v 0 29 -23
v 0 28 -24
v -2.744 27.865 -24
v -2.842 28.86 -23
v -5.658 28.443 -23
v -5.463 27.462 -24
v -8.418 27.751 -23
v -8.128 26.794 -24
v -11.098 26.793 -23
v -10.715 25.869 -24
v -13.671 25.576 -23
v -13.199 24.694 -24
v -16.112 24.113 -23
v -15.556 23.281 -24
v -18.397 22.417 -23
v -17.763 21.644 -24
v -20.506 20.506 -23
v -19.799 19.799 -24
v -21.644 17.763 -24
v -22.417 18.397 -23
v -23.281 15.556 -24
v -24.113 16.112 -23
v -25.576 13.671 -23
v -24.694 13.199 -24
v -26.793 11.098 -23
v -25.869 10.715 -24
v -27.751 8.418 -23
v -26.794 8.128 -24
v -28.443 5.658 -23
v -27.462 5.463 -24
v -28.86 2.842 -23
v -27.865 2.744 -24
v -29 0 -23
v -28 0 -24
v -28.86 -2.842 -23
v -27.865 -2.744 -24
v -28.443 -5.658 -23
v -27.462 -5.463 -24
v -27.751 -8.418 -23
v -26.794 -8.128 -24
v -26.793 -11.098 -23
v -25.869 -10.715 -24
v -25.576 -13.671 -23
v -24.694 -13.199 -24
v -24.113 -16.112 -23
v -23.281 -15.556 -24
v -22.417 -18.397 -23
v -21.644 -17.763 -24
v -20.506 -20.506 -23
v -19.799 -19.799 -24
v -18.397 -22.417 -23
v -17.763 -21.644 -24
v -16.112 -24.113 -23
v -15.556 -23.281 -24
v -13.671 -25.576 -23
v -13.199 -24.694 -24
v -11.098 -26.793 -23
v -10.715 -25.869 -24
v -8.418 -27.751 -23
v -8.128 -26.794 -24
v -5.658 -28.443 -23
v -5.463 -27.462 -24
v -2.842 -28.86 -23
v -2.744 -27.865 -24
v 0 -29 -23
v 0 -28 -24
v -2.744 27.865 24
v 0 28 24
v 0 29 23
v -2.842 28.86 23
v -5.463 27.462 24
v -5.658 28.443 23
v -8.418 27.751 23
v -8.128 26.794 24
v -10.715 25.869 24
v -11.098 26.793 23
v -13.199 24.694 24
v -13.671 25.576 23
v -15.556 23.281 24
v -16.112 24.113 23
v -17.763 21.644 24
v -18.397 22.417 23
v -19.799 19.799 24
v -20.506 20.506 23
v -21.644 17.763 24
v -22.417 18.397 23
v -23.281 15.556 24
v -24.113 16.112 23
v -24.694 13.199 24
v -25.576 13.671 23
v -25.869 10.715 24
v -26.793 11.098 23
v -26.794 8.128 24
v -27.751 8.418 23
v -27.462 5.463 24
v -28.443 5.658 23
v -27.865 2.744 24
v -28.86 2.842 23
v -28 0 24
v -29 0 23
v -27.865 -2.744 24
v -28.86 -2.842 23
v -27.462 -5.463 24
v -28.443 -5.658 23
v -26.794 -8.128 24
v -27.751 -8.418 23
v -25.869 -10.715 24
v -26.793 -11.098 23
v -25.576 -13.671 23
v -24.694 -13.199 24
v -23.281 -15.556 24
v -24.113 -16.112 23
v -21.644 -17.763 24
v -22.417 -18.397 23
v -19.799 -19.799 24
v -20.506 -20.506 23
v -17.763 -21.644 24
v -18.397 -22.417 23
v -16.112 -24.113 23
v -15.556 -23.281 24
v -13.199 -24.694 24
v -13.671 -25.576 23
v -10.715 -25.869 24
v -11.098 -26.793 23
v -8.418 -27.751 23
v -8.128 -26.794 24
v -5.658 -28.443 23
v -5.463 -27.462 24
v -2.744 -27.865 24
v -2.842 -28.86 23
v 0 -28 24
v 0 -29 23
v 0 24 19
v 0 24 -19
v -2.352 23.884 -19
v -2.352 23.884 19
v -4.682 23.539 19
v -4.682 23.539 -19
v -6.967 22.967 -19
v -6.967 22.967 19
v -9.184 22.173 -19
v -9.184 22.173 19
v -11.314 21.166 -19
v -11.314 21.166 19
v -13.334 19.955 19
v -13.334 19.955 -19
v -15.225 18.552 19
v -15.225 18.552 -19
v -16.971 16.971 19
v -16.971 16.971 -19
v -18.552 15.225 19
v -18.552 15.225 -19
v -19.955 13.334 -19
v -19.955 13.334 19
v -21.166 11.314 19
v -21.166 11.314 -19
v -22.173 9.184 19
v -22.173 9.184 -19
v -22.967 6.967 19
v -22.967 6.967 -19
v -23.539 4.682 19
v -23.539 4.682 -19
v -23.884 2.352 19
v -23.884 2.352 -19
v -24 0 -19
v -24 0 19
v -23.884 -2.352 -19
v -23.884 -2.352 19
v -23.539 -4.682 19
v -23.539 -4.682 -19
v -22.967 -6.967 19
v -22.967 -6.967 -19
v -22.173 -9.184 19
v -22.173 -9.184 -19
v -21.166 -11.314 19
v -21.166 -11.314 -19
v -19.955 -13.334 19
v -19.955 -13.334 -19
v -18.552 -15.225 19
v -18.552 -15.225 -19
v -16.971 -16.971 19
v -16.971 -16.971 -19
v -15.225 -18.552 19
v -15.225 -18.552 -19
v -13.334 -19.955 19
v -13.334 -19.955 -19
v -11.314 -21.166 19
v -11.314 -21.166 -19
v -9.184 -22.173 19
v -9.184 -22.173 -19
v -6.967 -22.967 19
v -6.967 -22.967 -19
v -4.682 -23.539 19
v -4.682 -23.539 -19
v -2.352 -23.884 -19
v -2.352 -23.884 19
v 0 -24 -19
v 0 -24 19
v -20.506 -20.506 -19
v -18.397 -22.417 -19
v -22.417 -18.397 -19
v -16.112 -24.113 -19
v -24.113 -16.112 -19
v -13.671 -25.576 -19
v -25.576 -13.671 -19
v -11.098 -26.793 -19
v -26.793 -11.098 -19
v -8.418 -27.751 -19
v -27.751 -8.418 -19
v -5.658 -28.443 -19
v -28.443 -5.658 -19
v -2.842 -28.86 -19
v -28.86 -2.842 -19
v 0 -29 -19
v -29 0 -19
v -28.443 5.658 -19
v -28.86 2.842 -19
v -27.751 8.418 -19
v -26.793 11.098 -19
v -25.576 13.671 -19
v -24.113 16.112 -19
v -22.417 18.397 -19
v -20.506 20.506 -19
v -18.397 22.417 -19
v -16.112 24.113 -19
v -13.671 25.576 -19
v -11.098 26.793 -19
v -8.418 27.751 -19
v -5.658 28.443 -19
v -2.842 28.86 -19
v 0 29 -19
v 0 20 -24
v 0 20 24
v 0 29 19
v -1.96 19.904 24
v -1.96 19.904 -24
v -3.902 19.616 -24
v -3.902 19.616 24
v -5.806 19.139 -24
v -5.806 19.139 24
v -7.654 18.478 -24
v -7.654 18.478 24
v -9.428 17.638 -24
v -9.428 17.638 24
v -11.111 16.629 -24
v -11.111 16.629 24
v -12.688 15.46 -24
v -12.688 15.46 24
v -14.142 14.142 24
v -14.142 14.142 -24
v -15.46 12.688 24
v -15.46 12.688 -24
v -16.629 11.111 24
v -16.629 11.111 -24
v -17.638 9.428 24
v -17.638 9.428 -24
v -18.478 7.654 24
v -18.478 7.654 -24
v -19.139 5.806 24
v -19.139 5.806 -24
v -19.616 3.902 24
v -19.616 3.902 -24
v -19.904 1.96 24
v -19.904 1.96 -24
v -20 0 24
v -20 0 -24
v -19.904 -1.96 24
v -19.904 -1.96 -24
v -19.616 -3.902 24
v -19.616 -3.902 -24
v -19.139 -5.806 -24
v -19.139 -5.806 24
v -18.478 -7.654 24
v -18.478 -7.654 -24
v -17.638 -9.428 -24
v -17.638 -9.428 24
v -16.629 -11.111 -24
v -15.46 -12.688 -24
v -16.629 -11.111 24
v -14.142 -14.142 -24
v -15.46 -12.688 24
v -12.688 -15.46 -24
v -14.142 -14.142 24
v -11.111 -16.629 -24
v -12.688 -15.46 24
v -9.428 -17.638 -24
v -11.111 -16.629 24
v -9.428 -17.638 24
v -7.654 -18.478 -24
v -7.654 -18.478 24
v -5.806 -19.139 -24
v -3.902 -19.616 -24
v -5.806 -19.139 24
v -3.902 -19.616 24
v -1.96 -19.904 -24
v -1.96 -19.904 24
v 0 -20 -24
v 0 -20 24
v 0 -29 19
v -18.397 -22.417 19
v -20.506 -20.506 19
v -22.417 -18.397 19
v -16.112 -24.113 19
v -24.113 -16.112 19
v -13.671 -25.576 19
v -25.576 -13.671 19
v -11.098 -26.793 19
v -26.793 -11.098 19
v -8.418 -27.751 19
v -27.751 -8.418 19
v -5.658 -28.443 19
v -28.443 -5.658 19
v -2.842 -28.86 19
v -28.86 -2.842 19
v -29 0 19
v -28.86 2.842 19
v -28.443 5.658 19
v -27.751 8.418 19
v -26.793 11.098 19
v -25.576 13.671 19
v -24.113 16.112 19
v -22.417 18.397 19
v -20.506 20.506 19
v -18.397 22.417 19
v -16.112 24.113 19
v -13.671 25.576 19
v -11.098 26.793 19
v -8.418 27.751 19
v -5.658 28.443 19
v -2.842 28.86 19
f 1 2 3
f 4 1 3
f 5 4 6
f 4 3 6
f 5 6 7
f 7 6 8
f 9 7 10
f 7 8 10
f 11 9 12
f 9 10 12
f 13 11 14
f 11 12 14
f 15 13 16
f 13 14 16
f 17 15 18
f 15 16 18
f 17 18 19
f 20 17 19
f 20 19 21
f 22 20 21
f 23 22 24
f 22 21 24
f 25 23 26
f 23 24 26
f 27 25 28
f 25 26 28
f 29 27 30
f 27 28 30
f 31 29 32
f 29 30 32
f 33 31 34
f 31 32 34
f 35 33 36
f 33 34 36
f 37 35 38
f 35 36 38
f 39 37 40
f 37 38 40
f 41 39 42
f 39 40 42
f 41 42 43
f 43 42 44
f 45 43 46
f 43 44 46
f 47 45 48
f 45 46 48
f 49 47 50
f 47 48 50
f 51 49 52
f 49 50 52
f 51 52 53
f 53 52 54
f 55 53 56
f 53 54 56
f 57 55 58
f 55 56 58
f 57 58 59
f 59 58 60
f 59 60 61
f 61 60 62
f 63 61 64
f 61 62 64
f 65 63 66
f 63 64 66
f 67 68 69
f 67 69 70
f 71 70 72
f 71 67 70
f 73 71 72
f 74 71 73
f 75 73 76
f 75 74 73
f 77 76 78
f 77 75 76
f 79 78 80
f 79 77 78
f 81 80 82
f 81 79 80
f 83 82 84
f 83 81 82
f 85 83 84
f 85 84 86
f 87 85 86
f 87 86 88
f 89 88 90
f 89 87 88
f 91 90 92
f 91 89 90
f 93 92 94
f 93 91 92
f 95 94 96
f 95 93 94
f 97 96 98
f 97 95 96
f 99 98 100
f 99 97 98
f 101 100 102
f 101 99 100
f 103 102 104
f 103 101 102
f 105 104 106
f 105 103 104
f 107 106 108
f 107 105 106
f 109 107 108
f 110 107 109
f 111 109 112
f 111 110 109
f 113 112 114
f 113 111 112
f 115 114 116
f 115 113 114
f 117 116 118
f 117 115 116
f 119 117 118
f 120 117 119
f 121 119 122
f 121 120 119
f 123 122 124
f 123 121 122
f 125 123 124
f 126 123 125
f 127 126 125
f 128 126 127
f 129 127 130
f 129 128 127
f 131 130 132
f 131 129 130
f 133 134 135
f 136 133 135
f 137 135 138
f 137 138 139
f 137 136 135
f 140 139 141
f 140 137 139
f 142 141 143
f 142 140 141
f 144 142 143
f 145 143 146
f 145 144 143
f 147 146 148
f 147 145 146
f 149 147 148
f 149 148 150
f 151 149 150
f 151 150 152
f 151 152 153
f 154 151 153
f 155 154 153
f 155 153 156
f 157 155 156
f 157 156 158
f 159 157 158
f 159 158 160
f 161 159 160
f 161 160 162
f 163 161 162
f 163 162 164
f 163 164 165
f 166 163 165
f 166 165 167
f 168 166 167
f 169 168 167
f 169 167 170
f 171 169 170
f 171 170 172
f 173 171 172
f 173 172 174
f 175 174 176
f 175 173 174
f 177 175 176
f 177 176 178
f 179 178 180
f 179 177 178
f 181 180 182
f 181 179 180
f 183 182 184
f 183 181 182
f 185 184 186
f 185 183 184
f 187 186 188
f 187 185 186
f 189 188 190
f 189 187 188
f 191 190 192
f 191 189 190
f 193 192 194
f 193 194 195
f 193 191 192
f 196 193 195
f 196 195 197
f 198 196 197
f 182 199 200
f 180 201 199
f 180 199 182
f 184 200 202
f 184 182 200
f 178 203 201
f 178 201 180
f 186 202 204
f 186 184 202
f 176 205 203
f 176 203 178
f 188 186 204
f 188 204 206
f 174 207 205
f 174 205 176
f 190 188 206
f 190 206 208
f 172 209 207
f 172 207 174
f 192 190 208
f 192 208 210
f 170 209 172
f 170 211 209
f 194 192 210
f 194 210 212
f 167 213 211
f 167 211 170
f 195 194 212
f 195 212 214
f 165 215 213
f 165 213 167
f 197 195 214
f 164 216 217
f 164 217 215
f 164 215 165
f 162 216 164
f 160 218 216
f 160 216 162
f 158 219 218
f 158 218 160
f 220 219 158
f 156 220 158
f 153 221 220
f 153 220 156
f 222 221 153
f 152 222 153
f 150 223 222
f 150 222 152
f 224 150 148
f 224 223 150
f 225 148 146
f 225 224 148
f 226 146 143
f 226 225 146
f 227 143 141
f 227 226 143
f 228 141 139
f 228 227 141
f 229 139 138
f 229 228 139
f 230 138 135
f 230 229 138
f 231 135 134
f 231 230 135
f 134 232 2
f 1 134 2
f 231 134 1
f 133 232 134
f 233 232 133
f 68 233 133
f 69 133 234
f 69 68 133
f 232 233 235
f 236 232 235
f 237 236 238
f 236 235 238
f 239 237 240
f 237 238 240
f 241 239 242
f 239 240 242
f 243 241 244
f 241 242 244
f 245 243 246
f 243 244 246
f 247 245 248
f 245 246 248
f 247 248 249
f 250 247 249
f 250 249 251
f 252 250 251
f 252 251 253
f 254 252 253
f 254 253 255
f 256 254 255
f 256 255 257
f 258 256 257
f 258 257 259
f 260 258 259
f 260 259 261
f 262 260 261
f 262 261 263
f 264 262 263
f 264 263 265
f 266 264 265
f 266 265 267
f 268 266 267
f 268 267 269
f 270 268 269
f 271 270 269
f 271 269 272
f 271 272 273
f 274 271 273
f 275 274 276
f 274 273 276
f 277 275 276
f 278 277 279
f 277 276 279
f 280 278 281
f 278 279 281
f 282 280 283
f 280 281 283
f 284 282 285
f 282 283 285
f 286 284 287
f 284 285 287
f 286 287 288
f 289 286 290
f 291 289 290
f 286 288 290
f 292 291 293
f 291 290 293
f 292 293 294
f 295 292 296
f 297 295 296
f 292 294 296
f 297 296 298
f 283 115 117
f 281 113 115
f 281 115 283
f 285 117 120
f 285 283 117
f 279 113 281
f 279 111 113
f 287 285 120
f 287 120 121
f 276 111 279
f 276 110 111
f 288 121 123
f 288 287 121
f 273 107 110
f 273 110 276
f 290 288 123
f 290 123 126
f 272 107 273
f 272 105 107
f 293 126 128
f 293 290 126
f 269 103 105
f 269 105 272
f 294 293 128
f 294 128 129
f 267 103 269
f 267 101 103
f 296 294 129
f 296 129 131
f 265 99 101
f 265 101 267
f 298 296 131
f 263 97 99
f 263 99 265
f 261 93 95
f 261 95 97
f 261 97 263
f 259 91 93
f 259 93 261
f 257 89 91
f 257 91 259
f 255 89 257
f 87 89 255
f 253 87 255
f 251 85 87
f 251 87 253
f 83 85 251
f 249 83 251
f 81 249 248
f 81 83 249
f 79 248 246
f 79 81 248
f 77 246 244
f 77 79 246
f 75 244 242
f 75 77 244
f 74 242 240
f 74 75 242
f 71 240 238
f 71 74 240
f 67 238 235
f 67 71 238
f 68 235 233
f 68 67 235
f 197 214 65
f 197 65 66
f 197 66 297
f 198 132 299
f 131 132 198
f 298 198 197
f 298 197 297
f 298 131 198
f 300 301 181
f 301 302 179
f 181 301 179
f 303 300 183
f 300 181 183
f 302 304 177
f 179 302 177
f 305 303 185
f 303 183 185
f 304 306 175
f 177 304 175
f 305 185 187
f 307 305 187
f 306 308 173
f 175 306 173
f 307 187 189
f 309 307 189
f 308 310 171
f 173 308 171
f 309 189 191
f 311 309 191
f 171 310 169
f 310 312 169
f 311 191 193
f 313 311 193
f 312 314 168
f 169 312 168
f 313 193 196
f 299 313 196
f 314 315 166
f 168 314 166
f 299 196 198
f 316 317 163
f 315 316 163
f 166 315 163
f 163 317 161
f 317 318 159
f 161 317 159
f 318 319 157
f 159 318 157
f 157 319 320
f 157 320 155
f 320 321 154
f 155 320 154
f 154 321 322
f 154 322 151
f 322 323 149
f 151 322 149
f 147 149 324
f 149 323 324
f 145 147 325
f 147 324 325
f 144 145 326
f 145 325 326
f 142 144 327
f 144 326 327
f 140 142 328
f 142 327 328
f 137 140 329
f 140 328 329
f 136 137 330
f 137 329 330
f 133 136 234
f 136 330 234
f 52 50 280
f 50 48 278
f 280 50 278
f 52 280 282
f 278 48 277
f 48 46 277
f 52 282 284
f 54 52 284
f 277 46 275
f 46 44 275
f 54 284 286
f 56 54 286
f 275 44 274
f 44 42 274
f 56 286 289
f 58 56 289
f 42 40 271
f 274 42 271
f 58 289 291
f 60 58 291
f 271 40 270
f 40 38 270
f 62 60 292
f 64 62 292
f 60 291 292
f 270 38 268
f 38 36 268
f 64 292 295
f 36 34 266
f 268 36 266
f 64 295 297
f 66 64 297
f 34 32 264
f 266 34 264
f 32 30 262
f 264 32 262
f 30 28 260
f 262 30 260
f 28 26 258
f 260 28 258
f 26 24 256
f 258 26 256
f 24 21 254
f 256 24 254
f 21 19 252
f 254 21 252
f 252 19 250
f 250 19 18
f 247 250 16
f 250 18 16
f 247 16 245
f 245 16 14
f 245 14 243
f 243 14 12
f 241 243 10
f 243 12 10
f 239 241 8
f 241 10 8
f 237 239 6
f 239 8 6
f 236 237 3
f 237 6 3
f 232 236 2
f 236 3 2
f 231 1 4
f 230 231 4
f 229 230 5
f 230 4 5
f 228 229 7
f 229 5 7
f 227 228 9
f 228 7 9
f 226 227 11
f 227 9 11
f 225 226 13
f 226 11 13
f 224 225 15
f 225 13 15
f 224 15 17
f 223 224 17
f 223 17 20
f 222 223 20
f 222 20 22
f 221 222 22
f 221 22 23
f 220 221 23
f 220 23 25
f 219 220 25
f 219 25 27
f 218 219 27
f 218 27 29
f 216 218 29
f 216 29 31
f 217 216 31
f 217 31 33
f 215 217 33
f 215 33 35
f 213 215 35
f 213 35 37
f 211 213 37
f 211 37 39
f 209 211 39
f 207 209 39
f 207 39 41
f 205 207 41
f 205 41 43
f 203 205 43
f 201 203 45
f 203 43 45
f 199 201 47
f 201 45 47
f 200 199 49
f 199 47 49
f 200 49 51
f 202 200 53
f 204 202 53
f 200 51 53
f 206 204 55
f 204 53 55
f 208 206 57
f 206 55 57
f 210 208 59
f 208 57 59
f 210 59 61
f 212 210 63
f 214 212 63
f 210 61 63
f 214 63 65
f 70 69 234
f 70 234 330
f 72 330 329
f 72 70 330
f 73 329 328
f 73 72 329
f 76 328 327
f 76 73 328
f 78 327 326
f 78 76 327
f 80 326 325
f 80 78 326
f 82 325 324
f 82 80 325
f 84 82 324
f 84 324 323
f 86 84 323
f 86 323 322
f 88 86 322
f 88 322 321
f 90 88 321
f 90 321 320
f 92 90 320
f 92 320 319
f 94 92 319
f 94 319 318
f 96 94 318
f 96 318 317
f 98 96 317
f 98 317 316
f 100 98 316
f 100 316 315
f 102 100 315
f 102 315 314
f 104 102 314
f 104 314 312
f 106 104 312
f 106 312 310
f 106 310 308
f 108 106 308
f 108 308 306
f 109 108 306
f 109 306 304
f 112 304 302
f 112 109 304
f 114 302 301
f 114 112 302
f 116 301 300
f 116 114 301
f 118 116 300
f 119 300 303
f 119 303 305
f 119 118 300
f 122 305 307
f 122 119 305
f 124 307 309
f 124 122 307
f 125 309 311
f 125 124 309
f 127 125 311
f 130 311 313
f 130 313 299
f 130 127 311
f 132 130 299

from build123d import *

# Parameters (mm, degrees)
SKETCH_1_R          = 24
SKETCH_1_R_2        = 20
EXTRUDE_1_DEPTH     = 24
SKETCH_2_R          = 29
SKETCH_2_R_2        = 24
EXTRUDE_2_DEPTH     = 5
SKETCH_3_W          = 29
SKETCH_3_H          = 58
CUT_EXTRUDE_1_DEPTH = 49
CHAMFER_1_SIZE      = 1


with BuildPart() as part:
    # Эскиз1 → Бобышка-Вытянуть1 (new body)
    with BuildSketch(Plane.XY):
        Circle(SKETCH_1_R)
        Circle(SKETCH_1_R_2, mode=Mode.SUBTRACT)
    extrude(amount=EXTRUDE_1_DEPTH)

    # Эскиз2 → Бобышка-Вытянуть2 (add)
    with BuildSketch(Plane.XY.offset(24)):
        Circle(SKETCH_2_R)
        Circle(SKETCH_2_R_2, mode=Mode.SUBTRACT)
    extrude(amount=-EXTRUDE_2_DEPTH)

    # Зеркальное отражение1: part across plane


with BuildPart() as part_1:
    add(part.part)
    add(part.part.mirror(Plane.XY))

    # Эскиз3 → Вырез-Вытянуть1 (cut, through all)
    with BuildSketch(Plane.XY.offset(24)):
        with Locations((14.5, 0)):
            Rectangle(SKETCH_3_W, SKETCH_3_H)
    extrude(amount=-CUT_EXTRUDE_1_DEPTH, mode=Mode.SUBTRACT)

    # Фаска1
    chamfer_1_edges = [part_1.edges().sort_by_distance(p)[0] for p in [
        (-29, 0, -24),
        (-29, 0, 24),
    ]]
    chamfer(chamfer_1_edges, length=CHAMFER_1_SIZE)


solid = part_1.part
